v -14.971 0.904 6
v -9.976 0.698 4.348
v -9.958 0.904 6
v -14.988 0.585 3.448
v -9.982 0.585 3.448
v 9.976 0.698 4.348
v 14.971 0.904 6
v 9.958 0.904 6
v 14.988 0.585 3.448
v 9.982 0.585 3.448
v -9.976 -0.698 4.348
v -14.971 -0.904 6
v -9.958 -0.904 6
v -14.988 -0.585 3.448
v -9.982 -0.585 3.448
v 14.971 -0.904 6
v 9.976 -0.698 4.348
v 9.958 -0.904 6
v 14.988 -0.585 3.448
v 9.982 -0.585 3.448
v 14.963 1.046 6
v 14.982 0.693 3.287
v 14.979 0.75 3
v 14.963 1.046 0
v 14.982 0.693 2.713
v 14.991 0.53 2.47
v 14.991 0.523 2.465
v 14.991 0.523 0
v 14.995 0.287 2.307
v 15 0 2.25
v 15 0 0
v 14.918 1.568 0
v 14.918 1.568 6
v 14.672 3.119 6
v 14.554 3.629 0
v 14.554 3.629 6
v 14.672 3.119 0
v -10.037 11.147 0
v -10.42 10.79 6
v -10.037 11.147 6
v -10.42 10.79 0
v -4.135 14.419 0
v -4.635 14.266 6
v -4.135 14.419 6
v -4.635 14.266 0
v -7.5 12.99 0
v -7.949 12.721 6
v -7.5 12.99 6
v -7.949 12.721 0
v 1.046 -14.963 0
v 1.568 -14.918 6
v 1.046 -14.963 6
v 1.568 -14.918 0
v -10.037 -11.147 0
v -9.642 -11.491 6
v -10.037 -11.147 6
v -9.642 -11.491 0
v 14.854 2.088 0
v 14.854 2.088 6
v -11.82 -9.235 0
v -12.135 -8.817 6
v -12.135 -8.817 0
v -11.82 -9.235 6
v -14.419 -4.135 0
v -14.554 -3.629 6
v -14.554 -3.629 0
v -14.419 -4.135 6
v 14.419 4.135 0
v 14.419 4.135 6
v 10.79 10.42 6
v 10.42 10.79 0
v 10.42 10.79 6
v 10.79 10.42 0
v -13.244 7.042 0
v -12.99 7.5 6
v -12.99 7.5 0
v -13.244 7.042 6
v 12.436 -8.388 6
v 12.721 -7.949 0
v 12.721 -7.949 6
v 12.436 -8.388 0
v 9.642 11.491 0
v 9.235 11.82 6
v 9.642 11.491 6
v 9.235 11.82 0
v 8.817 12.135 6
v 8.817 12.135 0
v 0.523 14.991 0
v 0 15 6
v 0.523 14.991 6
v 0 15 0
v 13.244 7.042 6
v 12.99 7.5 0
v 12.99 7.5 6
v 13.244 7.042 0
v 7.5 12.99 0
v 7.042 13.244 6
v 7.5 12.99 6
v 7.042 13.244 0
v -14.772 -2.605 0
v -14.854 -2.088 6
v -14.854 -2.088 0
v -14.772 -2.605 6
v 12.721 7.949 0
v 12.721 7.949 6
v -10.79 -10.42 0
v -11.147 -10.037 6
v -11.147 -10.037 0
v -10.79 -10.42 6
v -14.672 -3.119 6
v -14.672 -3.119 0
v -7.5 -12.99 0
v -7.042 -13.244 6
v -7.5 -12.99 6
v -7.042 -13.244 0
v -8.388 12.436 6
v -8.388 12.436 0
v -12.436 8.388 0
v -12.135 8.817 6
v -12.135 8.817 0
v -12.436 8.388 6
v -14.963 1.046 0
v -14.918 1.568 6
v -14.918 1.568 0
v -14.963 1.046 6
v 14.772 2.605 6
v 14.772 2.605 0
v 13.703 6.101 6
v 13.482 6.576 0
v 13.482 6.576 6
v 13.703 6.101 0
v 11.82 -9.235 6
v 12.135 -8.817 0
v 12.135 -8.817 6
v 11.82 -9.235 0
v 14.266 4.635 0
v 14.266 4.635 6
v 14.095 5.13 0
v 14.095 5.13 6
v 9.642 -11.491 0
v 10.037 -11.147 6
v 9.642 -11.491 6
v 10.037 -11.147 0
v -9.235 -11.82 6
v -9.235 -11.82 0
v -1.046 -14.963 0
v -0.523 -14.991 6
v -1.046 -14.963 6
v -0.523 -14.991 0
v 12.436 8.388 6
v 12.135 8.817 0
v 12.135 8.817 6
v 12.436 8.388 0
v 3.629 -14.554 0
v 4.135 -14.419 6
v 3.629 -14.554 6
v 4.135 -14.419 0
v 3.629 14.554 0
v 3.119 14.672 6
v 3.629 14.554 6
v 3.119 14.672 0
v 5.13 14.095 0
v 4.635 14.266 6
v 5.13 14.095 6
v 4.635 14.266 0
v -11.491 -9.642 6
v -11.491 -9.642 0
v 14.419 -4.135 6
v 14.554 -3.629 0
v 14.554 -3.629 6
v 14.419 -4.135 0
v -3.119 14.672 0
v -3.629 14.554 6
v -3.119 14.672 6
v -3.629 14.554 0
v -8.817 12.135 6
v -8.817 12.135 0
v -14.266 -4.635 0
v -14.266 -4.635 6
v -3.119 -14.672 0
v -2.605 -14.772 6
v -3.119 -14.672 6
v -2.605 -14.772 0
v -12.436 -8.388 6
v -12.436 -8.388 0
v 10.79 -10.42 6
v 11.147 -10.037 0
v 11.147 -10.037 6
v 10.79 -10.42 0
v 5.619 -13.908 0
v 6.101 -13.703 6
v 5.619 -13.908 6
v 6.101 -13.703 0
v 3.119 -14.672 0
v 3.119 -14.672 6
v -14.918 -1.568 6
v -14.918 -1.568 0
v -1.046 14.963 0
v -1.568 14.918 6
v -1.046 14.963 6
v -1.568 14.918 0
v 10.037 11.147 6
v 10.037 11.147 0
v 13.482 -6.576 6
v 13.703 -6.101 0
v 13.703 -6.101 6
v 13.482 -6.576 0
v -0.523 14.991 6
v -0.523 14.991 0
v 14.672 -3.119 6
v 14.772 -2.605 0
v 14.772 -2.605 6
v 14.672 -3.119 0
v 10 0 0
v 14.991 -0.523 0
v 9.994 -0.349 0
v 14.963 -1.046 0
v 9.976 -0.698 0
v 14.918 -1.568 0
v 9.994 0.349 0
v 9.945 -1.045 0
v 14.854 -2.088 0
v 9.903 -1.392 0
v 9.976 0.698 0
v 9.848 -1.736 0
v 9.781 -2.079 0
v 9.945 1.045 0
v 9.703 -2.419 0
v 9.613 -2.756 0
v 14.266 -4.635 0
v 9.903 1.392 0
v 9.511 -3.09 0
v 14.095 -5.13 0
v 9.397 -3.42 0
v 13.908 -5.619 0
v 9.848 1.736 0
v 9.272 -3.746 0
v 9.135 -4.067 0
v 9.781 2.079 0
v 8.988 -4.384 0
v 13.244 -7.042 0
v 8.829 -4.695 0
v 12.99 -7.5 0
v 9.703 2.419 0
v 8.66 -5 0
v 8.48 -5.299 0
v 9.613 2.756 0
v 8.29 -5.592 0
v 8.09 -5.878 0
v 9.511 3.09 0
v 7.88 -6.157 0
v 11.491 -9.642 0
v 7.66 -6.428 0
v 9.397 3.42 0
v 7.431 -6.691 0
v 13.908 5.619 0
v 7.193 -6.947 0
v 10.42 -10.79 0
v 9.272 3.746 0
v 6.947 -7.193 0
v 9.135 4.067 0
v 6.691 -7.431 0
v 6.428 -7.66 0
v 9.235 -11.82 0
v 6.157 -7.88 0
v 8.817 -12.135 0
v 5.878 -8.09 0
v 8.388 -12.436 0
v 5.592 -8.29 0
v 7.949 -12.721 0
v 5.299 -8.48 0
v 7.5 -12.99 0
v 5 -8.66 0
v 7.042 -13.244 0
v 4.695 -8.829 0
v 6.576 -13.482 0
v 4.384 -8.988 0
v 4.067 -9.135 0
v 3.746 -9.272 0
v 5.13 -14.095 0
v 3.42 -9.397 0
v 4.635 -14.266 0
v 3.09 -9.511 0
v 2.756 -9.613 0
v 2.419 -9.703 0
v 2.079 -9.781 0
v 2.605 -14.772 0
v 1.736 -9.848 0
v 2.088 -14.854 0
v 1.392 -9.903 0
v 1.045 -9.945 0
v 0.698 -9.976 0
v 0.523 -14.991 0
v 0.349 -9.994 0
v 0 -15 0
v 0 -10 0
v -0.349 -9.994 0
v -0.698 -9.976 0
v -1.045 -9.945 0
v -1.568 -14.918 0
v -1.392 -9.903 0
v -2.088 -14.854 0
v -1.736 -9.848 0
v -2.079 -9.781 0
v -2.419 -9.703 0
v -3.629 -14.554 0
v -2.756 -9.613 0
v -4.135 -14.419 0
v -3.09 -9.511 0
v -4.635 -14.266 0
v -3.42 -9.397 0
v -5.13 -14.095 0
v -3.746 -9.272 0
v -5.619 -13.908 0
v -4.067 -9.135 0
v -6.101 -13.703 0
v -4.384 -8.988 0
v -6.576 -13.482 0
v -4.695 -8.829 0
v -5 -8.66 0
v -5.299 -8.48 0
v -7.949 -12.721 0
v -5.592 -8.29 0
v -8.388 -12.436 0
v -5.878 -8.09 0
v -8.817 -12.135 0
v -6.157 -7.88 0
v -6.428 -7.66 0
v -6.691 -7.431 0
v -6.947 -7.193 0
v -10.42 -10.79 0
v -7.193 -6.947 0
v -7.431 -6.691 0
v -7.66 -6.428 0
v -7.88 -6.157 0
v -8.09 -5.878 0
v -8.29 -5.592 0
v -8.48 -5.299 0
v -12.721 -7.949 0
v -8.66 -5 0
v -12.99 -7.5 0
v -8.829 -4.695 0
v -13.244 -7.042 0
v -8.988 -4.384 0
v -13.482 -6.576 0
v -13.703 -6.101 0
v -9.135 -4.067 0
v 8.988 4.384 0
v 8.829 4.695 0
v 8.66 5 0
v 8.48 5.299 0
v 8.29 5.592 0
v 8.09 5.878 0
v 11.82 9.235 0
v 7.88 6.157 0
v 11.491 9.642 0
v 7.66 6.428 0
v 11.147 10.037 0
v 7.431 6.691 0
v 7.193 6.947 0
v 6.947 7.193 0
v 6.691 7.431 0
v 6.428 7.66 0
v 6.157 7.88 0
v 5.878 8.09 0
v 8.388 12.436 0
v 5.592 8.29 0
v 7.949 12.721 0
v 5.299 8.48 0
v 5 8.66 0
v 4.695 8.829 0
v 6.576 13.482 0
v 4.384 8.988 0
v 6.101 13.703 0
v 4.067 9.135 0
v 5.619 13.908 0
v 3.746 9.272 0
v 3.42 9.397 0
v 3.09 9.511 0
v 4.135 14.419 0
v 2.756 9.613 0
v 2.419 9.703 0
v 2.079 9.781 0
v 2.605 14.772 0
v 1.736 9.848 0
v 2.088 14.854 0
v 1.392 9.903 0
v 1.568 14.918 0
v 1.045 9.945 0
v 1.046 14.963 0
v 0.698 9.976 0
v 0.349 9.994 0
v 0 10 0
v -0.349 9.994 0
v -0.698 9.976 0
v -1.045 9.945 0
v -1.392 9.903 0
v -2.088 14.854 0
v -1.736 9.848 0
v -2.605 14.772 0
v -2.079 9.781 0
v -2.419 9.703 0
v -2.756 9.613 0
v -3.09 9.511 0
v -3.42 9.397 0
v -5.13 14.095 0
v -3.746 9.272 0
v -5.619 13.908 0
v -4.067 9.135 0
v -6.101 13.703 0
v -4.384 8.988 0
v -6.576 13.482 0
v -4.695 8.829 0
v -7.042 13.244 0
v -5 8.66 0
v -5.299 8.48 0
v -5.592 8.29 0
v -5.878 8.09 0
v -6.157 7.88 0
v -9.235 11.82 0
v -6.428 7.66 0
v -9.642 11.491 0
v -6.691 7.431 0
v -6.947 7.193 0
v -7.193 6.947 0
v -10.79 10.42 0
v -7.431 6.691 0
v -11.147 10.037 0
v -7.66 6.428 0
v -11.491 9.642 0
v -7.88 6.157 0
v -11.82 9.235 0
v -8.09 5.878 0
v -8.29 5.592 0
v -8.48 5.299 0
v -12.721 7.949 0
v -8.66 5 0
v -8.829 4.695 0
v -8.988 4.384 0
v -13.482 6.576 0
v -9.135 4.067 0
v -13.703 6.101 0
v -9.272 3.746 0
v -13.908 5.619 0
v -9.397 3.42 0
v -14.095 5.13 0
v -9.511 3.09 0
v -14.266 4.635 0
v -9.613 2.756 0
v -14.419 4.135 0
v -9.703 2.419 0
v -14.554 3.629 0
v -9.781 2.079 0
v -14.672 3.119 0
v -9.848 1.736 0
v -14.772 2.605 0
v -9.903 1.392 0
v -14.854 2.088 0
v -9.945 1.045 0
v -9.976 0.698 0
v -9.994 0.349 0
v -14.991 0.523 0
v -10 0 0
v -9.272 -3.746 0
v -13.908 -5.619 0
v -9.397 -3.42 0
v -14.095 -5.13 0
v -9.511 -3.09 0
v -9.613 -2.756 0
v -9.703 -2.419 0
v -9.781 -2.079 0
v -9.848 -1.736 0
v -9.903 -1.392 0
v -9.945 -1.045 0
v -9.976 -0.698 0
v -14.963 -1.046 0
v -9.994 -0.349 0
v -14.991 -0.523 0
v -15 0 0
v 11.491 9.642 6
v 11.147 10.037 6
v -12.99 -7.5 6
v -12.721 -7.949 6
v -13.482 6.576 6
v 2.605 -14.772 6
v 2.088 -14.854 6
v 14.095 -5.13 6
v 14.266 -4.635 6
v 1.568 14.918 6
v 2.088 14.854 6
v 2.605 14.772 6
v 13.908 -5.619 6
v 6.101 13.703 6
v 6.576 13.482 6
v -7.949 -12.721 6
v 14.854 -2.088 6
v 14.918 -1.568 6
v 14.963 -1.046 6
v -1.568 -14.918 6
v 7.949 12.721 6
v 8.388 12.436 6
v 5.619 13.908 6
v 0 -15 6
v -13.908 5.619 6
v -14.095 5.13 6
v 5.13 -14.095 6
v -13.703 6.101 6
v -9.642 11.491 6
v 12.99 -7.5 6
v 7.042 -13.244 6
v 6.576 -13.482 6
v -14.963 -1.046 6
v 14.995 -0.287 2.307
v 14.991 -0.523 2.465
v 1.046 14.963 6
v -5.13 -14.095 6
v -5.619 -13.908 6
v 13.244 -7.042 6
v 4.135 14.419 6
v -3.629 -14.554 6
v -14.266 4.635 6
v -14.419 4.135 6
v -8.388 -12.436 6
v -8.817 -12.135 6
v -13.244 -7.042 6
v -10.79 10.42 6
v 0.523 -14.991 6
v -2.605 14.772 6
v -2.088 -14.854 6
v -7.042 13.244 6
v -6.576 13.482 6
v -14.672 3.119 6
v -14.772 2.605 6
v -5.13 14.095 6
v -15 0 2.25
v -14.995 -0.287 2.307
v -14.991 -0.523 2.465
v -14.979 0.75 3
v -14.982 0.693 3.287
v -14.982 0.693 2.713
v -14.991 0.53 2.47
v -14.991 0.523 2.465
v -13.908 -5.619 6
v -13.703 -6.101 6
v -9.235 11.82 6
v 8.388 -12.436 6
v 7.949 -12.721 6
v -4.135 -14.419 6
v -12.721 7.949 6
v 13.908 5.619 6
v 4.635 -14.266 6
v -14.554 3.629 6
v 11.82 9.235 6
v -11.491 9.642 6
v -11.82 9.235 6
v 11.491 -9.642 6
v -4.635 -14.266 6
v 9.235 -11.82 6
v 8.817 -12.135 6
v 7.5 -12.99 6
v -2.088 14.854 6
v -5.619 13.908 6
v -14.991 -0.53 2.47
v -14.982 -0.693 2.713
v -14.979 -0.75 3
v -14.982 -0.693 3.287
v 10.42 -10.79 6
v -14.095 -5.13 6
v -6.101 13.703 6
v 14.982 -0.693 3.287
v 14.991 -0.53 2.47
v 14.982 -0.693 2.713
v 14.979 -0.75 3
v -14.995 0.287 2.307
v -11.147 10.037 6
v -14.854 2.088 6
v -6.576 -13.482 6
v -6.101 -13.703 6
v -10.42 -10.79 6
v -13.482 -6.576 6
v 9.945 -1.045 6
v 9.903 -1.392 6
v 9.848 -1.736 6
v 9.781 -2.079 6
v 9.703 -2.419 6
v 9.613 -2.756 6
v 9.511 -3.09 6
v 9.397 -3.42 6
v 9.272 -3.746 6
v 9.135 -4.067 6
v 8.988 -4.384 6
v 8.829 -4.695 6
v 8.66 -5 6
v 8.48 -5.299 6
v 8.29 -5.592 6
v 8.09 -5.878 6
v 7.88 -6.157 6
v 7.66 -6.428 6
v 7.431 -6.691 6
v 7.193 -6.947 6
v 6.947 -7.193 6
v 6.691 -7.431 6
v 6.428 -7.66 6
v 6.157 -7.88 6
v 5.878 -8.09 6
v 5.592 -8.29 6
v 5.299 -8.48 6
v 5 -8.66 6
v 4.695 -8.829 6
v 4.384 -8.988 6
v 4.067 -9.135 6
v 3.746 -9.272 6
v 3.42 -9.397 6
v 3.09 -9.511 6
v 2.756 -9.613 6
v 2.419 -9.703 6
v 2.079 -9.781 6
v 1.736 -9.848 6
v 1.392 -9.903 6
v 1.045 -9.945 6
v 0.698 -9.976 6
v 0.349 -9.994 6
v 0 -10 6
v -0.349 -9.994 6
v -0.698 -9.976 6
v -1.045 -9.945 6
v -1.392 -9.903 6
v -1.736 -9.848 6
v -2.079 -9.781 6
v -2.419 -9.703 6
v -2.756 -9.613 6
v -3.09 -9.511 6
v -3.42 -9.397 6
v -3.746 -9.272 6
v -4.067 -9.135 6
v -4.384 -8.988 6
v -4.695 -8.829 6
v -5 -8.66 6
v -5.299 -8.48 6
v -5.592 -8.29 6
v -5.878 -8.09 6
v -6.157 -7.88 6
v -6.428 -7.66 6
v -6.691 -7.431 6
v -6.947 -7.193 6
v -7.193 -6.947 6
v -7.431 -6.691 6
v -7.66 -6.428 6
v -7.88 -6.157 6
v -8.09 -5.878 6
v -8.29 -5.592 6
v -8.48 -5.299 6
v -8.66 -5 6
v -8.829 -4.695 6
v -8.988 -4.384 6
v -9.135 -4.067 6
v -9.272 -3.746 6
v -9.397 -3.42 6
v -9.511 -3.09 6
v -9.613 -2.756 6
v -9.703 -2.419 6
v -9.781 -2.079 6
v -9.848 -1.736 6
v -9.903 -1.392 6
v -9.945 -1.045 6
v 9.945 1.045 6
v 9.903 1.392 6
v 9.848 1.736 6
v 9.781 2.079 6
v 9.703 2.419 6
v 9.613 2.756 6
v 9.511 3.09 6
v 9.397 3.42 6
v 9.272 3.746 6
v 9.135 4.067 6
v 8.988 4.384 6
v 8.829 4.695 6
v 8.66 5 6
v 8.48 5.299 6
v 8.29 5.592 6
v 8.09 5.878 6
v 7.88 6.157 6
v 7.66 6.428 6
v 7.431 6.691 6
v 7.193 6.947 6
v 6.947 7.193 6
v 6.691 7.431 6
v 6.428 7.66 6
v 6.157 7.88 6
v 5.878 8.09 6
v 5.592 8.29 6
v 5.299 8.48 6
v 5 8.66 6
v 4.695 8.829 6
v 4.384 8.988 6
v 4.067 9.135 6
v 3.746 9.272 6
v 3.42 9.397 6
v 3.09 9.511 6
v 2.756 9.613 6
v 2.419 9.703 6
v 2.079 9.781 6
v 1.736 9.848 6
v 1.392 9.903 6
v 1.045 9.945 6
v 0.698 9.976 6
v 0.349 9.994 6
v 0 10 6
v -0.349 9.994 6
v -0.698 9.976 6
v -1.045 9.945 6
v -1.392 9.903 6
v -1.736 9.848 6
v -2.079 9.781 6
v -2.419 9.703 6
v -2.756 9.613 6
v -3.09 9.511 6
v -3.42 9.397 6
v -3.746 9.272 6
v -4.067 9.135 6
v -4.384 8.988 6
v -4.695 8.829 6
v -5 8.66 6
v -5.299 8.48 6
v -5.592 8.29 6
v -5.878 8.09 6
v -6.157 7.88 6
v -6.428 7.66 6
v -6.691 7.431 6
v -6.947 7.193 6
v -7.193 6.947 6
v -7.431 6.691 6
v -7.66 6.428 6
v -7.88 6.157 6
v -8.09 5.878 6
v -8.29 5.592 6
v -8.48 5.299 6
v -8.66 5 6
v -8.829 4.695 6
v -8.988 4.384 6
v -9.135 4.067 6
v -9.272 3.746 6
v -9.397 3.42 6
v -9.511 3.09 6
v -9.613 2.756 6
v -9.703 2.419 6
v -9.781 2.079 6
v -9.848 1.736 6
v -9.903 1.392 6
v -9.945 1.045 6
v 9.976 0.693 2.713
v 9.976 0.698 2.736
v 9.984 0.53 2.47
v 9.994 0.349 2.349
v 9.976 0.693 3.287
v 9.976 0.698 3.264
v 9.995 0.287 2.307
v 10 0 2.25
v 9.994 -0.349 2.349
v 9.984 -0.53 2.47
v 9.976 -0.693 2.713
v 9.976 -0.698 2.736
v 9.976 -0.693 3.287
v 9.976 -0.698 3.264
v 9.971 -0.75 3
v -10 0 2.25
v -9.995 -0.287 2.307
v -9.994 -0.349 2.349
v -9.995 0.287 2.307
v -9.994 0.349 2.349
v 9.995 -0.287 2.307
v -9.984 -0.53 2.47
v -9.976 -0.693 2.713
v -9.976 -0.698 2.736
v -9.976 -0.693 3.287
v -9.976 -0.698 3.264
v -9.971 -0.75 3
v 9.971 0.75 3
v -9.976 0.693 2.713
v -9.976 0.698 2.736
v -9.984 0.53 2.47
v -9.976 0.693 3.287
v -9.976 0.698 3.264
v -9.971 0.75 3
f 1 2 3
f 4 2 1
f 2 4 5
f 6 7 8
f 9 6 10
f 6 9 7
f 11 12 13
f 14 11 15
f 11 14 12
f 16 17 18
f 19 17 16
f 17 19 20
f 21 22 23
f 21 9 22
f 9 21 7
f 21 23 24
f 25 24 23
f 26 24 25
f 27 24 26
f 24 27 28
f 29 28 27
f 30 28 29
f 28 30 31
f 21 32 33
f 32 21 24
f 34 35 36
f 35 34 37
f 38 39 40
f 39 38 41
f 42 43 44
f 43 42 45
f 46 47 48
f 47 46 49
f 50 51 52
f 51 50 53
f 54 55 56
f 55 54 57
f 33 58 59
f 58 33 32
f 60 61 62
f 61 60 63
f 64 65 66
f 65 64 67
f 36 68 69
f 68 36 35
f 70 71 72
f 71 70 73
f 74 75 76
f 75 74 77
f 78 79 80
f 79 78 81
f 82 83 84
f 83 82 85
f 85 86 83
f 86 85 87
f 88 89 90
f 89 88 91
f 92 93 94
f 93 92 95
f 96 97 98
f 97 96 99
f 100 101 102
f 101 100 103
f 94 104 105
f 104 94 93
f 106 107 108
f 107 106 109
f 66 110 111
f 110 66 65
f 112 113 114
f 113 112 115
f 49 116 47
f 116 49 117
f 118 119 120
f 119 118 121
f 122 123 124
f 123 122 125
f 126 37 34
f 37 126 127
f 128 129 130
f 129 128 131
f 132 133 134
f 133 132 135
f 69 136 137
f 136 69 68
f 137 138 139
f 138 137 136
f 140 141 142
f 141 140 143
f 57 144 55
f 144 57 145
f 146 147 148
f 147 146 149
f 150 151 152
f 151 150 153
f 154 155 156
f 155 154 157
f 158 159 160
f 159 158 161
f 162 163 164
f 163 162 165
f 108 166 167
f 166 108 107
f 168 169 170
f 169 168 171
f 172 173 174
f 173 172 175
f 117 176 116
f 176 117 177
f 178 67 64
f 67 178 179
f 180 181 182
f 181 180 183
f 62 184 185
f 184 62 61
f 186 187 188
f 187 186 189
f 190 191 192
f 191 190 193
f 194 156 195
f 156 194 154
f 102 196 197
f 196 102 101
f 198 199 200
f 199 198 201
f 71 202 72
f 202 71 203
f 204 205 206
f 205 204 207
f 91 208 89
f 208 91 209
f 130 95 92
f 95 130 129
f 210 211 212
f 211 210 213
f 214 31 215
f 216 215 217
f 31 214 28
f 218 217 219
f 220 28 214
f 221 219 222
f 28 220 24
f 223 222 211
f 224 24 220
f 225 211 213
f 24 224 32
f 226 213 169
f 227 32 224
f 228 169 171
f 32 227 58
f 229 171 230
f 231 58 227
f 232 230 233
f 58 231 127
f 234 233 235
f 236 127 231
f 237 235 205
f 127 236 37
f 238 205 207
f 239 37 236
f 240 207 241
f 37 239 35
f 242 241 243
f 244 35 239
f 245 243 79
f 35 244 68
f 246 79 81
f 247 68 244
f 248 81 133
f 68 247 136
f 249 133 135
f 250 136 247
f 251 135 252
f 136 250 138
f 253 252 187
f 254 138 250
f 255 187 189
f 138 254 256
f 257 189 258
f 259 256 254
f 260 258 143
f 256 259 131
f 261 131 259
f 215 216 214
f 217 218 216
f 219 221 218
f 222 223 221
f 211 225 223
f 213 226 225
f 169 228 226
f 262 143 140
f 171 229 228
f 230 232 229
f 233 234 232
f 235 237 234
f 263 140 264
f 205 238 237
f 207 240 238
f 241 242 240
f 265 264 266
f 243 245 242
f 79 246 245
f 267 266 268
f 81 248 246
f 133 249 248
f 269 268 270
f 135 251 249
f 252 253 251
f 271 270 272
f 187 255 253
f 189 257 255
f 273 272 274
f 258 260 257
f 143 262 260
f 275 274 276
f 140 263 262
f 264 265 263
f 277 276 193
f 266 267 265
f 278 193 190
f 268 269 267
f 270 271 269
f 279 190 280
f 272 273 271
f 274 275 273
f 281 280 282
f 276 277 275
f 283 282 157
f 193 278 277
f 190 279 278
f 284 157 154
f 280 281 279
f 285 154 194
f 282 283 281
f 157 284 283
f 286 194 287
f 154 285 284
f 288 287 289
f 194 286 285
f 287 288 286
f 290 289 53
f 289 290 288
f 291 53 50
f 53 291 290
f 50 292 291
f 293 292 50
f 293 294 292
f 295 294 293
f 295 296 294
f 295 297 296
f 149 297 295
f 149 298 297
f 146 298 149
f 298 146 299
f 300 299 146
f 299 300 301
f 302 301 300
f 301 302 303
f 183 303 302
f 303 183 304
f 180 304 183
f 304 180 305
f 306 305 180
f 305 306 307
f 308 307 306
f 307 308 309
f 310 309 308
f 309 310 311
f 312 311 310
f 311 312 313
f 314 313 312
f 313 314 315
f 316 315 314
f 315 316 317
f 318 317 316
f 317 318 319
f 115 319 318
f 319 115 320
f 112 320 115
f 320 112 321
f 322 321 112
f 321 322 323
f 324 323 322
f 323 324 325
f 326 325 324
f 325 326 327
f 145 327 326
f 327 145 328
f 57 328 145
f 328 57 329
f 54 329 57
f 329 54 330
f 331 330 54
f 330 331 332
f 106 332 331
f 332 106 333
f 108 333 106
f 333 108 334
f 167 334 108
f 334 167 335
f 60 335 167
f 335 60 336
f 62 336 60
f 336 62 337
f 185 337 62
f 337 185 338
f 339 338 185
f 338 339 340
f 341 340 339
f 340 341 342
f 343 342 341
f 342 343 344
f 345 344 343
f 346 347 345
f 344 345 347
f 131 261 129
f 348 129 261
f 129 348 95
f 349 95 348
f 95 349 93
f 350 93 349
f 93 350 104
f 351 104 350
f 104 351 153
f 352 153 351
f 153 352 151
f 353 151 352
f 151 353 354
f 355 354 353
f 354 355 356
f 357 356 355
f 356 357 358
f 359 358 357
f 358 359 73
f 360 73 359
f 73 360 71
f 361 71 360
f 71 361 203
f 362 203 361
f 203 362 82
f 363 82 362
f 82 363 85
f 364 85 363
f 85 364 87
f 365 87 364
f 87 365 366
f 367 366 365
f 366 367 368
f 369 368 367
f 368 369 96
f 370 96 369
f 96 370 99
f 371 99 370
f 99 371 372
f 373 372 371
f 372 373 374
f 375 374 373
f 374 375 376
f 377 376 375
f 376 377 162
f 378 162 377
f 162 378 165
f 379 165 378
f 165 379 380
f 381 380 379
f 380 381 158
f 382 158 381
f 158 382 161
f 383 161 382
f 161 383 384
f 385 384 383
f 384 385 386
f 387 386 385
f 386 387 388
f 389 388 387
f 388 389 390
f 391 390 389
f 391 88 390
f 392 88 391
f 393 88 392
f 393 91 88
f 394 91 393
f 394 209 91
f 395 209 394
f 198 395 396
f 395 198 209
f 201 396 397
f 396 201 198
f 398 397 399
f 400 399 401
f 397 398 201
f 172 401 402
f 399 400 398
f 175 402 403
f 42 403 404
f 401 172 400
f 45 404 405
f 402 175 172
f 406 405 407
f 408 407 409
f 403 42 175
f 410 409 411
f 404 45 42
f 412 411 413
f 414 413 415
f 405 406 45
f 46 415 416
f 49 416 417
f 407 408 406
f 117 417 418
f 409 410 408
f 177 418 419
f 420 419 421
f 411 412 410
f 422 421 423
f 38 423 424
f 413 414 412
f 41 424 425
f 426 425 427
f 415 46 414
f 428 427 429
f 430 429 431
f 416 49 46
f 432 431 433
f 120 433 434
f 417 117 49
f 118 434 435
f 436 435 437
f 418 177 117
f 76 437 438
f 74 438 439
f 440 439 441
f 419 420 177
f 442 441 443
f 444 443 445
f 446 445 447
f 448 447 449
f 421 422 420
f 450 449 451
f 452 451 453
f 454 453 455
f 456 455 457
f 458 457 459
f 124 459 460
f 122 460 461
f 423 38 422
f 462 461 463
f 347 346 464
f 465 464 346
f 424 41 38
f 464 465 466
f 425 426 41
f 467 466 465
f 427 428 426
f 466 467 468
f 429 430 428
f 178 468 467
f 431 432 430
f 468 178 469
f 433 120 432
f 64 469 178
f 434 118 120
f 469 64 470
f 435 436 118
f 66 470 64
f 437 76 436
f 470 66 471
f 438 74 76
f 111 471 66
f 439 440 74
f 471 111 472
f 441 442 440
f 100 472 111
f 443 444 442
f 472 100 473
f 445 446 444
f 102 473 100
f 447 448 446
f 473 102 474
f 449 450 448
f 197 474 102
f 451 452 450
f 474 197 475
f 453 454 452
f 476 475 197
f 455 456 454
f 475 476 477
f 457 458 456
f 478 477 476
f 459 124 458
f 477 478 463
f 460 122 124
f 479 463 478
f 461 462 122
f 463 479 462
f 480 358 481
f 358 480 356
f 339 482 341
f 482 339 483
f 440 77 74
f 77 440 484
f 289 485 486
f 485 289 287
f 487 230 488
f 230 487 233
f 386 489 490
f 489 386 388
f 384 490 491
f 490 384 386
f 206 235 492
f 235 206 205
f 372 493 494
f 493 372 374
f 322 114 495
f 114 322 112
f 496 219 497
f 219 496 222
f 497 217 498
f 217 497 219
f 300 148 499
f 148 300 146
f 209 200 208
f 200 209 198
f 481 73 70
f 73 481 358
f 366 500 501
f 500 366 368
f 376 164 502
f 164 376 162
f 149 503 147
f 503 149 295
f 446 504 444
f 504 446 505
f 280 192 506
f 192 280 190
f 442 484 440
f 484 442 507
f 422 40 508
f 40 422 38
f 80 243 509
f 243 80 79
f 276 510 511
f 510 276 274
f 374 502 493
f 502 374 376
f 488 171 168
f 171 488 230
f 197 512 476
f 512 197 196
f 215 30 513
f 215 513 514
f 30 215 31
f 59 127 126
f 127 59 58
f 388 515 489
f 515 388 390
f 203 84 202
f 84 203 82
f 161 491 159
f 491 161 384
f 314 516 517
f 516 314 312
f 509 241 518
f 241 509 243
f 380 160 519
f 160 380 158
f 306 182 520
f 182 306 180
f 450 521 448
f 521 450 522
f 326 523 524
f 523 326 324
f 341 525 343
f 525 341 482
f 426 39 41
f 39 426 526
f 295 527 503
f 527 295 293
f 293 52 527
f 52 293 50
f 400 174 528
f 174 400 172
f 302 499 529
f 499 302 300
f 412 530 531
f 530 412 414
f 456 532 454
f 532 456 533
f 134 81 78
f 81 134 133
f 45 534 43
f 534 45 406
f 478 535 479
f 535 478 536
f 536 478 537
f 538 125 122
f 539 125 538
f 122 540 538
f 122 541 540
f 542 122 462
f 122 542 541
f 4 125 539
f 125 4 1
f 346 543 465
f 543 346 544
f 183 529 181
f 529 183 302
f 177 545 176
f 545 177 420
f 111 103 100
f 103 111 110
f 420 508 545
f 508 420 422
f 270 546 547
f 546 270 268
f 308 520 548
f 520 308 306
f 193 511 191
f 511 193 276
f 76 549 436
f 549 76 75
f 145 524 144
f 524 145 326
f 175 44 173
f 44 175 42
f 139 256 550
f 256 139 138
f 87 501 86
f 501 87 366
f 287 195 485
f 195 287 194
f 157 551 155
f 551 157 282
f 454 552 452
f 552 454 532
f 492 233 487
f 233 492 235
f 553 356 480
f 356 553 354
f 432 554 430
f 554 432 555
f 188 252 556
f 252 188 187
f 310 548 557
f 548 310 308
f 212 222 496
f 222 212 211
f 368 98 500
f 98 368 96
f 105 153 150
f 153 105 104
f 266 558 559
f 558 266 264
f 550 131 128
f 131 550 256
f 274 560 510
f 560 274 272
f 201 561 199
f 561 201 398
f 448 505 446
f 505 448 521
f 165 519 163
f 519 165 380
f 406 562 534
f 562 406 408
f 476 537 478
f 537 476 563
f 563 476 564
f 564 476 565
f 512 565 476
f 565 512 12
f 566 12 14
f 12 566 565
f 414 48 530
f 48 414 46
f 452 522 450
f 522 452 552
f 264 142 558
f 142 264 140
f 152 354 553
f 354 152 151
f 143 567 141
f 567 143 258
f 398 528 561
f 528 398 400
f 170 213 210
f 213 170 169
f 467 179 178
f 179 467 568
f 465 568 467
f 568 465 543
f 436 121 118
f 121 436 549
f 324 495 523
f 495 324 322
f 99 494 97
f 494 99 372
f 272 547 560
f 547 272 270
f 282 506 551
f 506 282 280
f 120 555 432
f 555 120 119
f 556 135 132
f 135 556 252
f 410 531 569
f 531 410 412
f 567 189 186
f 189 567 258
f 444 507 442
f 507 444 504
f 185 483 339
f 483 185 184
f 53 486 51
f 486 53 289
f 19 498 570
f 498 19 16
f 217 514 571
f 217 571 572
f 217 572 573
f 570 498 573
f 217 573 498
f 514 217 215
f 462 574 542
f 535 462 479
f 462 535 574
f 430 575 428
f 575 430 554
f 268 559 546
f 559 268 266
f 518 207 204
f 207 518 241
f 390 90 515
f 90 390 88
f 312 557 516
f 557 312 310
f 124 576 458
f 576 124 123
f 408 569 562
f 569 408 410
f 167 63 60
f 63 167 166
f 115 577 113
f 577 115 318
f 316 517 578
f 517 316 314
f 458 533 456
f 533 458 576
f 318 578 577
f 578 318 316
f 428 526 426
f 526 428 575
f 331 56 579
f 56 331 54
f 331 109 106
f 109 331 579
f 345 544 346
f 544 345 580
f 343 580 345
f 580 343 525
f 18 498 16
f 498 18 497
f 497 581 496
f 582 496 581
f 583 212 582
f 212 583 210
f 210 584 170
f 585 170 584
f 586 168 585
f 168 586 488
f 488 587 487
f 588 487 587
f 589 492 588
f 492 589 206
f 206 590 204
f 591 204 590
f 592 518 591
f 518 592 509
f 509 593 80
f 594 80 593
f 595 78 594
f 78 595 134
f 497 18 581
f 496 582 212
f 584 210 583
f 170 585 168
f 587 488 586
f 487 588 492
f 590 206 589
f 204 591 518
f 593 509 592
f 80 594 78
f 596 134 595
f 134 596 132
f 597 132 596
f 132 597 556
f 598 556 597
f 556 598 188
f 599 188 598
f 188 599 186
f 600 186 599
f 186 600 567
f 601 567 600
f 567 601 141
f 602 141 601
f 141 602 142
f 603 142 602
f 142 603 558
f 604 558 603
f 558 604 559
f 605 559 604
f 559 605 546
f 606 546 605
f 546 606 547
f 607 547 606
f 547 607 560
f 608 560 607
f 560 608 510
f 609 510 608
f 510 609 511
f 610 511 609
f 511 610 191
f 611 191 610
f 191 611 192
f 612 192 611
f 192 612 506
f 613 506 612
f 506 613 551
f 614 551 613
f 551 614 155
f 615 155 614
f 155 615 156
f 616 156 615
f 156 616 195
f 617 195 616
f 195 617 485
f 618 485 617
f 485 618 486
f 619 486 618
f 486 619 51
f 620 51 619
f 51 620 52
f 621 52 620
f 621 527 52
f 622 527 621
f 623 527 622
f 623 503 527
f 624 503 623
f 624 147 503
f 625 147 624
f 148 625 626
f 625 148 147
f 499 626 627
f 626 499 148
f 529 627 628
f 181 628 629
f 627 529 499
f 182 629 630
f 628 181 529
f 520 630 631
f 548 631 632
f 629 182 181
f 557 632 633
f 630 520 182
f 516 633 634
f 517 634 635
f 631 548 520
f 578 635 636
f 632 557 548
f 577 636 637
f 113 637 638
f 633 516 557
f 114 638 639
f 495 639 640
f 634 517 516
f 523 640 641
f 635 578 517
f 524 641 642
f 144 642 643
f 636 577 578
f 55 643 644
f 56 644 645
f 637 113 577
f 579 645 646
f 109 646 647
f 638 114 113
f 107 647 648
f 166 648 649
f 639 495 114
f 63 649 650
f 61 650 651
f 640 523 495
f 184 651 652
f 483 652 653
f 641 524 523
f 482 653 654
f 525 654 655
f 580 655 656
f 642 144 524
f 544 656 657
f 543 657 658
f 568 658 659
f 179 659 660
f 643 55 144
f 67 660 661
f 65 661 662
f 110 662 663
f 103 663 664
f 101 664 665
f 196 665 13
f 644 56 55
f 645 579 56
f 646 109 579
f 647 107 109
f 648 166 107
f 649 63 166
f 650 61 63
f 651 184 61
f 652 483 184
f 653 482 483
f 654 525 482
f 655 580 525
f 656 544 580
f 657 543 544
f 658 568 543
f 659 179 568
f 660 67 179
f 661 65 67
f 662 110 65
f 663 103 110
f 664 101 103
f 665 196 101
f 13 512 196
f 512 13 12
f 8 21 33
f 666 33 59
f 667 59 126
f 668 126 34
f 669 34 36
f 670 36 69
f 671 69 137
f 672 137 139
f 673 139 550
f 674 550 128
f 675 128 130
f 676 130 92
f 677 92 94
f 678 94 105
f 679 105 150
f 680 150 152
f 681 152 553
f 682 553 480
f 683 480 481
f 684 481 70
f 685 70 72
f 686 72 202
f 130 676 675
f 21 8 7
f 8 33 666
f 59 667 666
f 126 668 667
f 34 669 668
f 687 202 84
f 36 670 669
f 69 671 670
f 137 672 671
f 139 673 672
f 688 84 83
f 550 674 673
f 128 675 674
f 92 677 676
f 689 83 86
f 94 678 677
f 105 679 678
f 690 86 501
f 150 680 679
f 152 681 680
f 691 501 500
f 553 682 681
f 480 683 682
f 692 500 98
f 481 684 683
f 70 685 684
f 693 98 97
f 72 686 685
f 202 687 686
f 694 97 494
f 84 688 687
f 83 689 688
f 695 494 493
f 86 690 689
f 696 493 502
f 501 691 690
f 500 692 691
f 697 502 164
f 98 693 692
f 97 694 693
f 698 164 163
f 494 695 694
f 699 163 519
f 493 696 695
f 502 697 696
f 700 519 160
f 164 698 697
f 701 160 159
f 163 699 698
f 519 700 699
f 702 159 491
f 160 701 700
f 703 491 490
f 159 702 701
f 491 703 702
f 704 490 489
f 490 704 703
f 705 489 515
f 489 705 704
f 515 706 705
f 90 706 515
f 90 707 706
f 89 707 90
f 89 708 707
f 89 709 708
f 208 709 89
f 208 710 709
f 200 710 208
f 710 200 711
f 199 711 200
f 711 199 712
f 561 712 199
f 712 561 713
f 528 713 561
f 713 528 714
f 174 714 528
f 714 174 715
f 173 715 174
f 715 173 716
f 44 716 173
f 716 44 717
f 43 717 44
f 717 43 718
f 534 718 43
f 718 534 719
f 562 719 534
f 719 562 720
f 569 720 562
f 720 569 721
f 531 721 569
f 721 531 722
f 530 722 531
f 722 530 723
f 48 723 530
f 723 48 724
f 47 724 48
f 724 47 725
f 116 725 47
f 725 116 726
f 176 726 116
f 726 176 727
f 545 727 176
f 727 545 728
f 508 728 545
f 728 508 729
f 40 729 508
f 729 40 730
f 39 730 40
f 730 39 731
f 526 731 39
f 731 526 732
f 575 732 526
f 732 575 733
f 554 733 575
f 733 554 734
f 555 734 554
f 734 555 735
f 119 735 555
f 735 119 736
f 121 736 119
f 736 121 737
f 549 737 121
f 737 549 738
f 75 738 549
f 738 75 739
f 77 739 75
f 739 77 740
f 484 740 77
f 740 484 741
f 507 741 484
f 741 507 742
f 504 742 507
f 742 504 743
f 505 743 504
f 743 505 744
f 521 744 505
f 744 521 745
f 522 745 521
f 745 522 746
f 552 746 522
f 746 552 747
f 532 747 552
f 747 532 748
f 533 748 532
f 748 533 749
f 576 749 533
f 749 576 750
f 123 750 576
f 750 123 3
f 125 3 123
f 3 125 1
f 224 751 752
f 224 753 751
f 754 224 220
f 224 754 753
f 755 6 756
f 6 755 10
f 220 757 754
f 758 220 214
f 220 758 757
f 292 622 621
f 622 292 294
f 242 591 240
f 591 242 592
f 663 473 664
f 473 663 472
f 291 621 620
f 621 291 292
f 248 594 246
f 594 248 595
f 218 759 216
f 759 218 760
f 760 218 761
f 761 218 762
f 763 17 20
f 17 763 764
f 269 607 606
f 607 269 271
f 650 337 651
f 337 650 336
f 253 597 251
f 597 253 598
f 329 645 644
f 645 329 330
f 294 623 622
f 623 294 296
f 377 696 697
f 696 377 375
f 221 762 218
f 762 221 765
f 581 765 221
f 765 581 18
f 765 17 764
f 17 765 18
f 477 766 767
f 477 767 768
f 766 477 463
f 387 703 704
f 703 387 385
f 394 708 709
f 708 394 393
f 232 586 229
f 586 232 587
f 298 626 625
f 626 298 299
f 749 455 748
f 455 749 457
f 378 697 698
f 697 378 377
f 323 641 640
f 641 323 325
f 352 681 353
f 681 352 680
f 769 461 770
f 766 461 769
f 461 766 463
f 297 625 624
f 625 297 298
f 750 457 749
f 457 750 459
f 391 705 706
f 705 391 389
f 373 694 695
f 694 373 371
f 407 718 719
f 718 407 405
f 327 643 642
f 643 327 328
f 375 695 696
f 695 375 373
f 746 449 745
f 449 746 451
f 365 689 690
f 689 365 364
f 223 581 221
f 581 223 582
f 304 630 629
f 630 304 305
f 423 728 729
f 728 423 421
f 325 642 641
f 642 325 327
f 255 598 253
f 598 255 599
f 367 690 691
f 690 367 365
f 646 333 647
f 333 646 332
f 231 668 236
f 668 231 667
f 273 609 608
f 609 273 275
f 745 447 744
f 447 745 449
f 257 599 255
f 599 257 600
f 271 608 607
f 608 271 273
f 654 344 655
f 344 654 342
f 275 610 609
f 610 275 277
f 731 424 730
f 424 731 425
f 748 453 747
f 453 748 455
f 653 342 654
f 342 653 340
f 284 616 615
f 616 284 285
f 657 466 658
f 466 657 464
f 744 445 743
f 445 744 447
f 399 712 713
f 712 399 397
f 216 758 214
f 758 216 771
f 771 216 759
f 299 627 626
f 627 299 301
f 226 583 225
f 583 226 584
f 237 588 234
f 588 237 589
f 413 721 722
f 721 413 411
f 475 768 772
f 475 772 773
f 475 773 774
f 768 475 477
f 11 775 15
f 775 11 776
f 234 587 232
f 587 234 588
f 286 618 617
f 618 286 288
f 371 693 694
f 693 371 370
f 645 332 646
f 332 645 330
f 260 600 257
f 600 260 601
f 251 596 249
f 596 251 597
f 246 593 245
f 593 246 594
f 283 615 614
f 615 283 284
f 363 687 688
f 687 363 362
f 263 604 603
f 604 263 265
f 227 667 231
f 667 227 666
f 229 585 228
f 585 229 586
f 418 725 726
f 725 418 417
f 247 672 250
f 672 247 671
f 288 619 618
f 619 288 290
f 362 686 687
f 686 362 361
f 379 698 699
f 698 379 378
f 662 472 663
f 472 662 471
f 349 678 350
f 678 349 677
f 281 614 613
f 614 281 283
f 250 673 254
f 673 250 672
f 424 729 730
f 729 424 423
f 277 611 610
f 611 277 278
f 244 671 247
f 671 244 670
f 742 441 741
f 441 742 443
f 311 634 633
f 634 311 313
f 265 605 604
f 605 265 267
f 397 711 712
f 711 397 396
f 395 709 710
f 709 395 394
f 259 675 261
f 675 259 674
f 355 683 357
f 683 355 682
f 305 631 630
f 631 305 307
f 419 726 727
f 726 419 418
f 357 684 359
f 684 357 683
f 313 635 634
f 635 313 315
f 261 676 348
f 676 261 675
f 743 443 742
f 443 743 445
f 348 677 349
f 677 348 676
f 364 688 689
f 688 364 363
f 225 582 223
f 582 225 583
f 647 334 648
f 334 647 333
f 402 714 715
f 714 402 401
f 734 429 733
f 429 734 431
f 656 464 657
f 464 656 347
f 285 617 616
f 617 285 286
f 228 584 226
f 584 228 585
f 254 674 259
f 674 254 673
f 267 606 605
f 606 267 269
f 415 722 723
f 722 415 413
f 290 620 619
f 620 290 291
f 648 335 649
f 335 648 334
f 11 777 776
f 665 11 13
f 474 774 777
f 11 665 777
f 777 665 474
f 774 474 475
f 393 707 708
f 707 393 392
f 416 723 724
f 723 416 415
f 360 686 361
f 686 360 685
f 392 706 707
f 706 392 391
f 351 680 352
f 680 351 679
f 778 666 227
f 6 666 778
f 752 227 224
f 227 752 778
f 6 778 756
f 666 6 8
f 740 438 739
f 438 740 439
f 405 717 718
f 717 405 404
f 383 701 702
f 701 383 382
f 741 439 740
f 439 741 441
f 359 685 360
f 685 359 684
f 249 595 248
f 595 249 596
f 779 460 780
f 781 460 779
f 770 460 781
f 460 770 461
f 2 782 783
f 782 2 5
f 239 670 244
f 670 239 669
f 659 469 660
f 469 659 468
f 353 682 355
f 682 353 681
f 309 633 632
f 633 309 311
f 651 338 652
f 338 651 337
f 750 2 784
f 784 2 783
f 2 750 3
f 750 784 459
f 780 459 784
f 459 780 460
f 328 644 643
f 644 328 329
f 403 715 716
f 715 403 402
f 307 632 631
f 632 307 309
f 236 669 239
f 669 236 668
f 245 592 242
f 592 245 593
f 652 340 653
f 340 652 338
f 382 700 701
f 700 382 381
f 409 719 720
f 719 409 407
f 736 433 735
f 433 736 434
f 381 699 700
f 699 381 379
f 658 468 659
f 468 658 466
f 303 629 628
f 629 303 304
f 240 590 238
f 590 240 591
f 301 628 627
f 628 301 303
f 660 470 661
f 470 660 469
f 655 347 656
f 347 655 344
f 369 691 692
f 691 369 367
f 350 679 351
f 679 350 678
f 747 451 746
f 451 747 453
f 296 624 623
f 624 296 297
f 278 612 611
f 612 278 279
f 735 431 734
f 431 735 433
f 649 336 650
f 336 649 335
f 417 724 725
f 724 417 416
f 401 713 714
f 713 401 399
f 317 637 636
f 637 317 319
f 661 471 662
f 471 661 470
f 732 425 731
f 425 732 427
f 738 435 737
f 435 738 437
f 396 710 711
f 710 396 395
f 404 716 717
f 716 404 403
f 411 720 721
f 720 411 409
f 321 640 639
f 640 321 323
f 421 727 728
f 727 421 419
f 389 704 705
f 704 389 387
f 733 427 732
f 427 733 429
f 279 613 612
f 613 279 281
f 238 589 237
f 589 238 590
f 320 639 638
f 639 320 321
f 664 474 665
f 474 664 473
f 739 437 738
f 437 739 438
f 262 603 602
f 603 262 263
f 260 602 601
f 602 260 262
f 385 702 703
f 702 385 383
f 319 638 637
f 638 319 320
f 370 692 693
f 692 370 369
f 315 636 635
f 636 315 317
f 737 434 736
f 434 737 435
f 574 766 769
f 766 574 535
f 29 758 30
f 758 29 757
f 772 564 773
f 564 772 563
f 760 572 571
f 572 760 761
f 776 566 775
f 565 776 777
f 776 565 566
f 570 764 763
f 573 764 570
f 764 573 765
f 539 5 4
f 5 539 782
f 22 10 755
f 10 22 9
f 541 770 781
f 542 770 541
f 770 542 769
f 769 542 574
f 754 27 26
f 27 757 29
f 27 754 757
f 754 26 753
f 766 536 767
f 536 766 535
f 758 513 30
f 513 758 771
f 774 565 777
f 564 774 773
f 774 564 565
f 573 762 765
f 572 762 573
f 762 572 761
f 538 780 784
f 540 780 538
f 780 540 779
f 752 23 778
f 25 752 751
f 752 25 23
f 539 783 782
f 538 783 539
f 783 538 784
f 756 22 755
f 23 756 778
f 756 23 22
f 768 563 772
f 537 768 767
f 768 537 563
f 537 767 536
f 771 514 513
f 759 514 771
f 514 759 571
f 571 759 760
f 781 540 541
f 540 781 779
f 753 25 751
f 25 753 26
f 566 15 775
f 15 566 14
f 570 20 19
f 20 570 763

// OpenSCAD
dia    = 1.5;
height = 6.0;
thickn = 5;

module antenna_ring (t=thickn, h=height, wd=dia, cyd=30)
{
    d1 = 0.7;
    d2 = 1.2;
    hh = h / 2;
    alpha = atan (((d2 - d1) / 2 * wd) / hh);
    difference () {
        cylinder (r=cyd/2, h=height);
        translate ([0, 0, -height])
            cylinder (r=cyd/2 - t, h=3*height);
        translate ([-1.5*cyd, 0, h-hh])
            rotate ([0, 90, 0])
                cylinder (r=wd/2, h=3*cyd);
        for (p = [-alpha, alpha]) {
            translate ([0, 0, h-hh])
                rotate ([p, 0, 0])
                    translate ([0, 0, h])
                        cube ([2*cyd, wd*d1, 2*h], center=true);
        }
    }
}

antenna_ring ($fa = 2, $fs = .3);
